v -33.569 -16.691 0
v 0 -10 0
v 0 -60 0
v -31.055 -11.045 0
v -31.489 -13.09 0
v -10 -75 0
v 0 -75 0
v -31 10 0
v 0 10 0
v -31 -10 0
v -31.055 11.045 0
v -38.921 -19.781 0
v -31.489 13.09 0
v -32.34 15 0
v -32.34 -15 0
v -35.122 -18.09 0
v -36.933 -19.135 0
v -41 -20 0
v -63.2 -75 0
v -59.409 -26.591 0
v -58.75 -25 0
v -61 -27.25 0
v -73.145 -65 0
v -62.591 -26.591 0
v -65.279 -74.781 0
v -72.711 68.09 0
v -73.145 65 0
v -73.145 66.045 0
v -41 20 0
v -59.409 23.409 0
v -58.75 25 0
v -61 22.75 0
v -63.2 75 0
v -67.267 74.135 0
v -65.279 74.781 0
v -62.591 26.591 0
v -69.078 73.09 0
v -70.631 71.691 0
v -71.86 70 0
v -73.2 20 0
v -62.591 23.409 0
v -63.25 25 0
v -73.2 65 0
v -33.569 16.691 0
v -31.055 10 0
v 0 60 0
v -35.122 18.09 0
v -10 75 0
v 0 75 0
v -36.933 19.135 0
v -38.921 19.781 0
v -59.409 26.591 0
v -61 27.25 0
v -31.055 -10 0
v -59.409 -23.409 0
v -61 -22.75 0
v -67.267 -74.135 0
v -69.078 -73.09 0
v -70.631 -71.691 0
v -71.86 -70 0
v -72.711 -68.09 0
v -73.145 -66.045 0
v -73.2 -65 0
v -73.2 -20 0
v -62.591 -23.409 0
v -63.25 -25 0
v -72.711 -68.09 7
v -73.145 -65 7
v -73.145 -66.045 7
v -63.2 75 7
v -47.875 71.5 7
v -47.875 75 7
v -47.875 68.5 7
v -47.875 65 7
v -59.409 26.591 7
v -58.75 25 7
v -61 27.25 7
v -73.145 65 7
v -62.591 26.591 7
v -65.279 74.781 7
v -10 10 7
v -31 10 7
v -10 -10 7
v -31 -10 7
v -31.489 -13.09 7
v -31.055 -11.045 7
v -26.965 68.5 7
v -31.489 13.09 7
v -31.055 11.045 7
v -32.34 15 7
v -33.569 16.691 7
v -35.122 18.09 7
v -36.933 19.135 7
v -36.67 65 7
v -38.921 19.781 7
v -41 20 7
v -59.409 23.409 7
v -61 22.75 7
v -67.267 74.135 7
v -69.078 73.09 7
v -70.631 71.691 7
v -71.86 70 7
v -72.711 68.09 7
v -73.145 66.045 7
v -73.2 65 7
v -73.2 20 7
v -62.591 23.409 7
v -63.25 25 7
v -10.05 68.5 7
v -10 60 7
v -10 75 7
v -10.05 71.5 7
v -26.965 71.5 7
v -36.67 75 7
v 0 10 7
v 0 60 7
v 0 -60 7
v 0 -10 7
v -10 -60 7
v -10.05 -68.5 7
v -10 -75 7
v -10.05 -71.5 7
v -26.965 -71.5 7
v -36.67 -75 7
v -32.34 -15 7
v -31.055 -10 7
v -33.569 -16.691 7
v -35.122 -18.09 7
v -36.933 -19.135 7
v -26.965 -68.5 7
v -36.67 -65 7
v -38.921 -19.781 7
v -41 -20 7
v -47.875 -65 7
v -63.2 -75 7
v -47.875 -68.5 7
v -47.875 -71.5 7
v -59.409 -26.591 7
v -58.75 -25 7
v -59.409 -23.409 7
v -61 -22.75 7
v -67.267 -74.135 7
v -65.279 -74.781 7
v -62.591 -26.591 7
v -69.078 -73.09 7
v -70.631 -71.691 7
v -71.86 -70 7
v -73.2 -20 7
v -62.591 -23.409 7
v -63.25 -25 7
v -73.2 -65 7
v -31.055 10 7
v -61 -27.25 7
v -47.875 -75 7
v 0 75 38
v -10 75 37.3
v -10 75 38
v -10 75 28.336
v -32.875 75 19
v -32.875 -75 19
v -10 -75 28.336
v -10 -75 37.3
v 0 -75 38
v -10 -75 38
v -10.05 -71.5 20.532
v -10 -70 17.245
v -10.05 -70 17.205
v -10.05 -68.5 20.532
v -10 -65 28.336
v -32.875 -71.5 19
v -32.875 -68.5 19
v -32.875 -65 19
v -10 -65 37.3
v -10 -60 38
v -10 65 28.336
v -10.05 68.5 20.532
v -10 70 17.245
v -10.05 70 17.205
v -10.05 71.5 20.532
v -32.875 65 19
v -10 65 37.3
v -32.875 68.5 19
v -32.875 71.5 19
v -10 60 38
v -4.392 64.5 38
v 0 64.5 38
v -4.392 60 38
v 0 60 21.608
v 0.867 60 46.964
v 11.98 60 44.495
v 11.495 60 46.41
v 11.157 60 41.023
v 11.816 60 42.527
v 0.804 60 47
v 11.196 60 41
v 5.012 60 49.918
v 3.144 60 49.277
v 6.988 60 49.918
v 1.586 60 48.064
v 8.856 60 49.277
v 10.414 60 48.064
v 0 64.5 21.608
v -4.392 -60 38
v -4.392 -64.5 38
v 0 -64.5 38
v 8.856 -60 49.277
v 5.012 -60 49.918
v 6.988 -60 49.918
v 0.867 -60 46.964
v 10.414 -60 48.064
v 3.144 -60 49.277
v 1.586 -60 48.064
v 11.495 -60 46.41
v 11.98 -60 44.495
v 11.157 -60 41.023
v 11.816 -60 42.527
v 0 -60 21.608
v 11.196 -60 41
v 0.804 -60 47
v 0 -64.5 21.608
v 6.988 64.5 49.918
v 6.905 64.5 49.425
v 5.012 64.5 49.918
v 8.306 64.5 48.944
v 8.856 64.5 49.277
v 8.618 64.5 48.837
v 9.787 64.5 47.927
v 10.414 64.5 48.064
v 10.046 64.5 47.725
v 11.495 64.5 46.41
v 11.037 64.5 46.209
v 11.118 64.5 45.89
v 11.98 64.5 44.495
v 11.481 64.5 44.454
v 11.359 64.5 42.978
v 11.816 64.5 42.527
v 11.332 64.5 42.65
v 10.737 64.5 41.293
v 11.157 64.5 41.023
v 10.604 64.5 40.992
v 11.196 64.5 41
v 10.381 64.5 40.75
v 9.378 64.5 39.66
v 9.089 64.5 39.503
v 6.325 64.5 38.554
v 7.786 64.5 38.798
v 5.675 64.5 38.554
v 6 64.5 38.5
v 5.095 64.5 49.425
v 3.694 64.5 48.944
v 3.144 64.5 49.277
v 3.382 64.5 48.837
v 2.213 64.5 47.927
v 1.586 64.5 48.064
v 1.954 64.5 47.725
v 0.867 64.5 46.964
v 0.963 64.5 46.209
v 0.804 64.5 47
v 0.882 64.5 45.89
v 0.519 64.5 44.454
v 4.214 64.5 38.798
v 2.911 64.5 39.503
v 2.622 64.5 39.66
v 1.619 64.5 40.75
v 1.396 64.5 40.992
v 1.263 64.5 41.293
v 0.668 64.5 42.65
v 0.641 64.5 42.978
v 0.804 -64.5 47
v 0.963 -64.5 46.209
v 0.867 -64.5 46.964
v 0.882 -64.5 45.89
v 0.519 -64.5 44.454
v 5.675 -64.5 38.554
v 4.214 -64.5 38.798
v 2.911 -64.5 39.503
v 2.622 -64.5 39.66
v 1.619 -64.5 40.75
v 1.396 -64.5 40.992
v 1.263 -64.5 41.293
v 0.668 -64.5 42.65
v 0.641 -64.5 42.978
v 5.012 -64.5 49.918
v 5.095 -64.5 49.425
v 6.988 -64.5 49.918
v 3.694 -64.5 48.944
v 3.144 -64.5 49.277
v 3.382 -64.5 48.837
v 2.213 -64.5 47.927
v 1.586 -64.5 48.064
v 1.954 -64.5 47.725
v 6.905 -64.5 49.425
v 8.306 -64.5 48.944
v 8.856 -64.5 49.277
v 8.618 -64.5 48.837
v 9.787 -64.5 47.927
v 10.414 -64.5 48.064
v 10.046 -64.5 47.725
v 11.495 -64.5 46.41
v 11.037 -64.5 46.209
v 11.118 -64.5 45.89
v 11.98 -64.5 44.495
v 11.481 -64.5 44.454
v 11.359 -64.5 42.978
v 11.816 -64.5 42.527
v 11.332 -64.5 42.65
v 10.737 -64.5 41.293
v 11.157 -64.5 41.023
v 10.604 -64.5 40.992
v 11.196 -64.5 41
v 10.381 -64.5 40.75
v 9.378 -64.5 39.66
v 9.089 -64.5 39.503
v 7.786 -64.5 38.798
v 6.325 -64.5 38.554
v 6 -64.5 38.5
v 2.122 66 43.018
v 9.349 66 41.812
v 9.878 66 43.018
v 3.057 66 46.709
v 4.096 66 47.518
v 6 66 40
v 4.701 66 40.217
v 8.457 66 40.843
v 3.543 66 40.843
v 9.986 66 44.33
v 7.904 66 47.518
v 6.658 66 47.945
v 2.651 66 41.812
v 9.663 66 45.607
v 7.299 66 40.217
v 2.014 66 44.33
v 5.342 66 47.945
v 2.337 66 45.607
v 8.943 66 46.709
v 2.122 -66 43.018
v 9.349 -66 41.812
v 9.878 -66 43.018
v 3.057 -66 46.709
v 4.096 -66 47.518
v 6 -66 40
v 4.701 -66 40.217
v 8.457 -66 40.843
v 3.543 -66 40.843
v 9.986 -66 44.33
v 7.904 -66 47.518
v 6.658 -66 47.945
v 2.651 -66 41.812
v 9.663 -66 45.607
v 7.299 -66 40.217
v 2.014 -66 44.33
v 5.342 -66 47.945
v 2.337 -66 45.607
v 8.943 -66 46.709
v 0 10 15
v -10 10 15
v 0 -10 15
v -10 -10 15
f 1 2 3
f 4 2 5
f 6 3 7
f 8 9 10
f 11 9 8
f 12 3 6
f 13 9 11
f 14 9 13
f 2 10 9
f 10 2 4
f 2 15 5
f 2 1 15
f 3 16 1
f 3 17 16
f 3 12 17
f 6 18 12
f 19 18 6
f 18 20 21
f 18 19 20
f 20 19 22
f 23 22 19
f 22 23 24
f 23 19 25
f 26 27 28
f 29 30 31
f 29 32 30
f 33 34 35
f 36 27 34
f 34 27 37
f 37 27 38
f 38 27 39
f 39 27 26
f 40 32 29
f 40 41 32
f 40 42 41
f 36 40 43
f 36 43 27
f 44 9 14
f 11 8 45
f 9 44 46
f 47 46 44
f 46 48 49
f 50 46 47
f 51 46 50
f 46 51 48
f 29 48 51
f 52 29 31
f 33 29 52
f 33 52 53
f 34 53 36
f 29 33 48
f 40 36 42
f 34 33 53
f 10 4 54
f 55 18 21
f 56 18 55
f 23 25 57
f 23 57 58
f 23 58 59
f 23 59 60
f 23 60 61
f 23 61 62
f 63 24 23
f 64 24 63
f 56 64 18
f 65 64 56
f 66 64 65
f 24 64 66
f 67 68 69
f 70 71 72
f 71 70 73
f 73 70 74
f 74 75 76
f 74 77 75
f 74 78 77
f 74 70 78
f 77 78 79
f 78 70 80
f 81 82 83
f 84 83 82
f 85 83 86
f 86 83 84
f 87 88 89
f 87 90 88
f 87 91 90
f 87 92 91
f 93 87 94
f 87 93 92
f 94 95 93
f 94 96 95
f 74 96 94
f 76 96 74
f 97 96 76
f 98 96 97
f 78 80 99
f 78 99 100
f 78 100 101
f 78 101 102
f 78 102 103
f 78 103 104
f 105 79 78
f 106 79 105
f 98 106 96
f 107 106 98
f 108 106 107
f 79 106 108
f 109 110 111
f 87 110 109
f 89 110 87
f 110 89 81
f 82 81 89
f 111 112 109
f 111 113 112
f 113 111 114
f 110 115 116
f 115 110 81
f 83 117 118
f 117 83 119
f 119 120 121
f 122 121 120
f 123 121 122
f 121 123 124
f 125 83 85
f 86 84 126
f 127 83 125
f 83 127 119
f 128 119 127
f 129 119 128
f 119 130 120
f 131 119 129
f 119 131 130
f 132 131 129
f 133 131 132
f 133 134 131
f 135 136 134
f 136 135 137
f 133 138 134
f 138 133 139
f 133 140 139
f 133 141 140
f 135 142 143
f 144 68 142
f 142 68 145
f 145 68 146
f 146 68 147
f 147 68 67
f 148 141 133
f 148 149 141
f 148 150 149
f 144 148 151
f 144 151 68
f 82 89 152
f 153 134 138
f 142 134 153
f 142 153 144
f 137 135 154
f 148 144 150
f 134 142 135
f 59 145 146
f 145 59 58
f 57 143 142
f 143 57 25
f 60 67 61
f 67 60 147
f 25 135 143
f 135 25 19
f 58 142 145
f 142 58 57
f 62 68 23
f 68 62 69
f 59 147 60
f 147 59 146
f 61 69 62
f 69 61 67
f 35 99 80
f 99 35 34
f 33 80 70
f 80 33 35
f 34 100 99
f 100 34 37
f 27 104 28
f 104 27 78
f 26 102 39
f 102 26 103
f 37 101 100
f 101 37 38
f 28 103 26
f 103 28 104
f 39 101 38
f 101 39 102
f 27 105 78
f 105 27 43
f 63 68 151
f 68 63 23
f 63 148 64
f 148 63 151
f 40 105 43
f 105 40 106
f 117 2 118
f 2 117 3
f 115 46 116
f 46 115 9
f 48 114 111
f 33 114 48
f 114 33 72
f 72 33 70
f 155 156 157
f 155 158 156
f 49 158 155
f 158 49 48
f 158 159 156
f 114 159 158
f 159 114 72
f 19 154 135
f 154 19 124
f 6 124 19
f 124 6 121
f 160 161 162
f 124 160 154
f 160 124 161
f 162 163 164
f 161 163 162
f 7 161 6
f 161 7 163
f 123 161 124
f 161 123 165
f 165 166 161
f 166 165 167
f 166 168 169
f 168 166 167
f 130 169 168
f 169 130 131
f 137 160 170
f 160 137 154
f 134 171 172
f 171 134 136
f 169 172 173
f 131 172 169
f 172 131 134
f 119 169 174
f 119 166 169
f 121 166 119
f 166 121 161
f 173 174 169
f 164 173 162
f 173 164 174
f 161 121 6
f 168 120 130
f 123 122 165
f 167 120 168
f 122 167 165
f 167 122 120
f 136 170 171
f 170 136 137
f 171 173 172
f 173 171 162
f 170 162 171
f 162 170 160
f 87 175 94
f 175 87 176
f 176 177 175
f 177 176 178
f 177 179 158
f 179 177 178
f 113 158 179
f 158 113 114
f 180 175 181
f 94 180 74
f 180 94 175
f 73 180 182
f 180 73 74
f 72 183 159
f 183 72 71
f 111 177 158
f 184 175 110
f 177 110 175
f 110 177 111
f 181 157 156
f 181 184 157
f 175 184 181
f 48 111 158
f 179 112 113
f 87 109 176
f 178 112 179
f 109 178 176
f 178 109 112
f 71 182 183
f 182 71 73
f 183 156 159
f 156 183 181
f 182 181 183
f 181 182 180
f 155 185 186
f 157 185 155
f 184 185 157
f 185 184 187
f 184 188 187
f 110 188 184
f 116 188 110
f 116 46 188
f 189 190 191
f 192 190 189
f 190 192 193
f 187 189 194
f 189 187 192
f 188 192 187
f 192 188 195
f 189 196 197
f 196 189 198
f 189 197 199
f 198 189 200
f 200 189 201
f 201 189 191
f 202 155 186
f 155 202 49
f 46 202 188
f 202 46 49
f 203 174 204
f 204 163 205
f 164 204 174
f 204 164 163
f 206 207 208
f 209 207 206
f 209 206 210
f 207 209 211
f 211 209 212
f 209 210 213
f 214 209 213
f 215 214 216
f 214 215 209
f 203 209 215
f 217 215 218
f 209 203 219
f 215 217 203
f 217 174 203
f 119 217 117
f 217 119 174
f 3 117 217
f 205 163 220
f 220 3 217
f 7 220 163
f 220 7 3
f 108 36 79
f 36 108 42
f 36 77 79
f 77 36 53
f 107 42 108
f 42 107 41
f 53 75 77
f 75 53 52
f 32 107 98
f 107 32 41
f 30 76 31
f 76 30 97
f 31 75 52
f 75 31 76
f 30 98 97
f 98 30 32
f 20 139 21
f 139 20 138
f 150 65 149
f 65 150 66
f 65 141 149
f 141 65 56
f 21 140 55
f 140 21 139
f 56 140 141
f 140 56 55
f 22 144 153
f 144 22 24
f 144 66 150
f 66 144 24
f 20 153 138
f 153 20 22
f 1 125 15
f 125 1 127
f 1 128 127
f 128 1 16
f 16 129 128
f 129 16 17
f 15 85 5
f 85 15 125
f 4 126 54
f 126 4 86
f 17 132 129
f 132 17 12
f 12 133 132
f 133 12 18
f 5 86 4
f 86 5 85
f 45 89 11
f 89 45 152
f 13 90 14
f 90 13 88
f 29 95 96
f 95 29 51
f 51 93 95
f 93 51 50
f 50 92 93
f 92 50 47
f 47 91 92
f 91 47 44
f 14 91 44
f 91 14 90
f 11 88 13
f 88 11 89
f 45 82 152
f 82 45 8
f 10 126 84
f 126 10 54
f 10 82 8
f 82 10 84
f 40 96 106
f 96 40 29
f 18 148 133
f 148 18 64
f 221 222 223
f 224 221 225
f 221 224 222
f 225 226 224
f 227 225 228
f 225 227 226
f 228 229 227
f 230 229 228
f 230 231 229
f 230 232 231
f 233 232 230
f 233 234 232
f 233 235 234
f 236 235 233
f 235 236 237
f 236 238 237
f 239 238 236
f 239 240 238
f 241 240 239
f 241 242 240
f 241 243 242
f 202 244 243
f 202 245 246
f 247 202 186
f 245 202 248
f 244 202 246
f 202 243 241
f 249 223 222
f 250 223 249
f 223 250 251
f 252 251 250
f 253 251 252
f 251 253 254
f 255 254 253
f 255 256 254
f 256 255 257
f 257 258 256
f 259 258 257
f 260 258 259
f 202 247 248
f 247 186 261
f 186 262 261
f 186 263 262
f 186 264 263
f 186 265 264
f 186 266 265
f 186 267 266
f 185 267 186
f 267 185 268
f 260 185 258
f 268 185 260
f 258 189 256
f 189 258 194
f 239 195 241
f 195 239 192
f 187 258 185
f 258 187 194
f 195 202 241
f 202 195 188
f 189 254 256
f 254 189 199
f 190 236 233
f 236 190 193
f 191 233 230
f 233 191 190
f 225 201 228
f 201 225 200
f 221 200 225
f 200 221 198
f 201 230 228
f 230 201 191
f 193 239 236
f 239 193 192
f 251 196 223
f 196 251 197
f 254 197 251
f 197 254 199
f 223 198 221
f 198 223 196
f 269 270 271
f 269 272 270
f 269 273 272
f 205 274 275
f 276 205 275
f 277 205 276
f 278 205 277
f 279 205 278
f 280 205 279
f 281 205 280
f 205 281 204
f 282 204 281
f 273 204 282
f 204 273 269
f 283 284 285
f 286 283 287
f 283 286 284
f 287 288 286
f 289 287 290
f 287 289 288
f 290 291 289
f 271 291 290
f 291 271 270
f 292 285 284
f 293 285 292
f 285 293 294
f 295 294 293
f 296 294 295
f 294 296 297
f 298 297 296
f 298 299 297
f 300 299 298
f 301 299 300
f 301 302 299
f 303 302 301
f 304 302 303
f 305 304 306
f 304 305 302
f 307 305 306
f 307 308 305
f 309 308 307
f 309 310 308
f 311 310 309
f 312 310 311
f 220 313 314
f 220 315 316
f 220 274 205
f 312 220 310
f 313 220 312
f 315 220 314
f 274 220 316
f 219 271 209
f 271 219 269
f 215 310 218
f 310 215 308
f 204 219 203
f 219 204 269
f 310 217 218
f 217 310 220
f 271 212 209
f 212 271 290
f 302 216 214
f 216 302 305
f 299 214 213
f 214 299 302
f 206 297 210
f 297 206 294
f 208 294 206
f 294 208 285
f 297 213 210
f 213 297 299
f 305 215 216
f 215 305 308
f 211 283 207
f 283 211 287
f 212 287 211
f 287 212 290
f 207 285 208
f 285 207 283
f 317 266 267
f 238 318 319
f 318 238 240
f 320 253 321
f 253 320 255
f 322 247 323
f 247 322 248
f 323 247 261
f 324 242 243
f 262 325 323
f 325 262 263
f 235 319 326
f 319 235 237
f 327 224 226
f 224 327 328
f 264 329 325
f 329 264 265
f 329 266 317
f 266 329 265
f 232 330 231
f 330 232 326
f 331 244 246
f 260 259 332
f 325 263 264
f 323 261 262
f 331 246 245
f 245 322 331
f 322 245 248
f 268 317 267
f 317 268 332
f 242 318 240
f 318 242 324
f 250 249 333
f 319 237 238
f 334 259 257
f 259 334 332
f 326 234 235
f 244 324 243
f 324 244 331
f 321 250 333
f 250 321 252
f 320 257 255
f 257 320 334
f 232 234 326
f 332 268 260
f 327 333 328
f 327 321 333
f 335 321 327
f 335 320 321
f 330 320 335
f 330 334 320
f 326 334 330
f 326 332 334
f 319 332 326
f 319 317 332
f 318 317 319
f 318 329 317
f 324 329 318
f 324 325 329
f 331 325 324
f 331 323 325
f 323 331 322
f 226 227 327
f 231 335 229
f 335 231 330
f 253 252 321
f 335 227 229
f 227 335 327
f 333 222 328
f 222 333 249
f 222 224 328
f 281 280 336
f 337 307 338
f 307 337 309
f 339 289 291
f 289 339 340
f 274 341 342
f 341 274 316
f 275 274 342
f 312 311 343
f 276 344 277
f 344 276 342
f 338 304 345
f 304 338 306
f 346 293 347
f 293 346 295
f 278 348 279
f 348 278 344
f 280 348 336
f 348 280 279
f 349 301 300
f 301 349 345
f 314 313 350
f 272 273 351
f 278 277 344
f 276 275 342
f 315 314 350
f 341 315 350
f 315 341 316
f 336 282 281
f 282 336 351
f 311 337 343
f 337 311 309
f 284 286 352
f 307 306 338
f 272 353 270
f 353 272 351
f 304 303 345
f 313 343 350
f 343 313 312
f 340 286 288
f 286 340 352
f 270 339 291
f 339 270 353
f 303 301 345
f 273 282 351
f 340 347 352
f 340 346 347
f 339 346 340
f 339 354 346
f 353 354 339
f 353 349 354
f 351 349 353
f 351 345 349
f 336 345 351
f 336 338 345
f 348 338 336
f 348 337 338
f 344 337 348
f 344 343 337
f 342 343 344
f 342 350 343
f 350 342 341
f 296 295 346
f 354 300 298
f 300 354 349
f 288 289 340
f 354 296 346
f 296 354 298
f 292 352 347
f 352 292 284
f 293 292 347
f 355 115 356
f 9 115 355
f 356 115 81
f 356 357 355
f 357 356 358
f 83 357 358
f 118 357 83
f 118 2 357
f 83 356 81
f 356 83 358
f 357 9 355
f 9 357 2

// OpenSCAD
// file: joiners.scad
include <config.scad>
use <GDMUtils.scad>


module half_joiner_clear(h=20, w=10, a=30)
{
	dmnd_height = h*1.0;
	dmnd_width = dmnd_height*tan(a);
	guide_size = w/3;
	guide_width = 2*(dmnd_height/2-guide_size)*tan(a);

	difference() {
		// Diamonds.
		scale([w, dmnd_width/2, dmnd_height/2]) {
			xrot(45) cube(size=[1,sqrt(2),sqrt(2)], center=true);
		}
		// Blunt point of tab.
		grid_of(ya=[-(guide_width/2+2), (guide_width/2+2)]) {
			cube(size=[w*1.05, 4, guide_size*2], center=true);
		}
	}
}
//half_joiner_clear();



module half_joiner(h=20, w=10, l=10, a=30, screwsize=3, guides=true, slop=printer_slop)
{
	dmnd_height = h*1.0;
	dmnd_width = dmnd_height*tan(a);
	guide_size = w/3;
	guide_width = 2*(dmnd_height/2-guide_size)*tan(a);

	difference() {
		union() {
			// Make base.
			difference() {
				// Solid backing base.
				translate([0,-l/2,0])
					cube(size=[w, l, h], center=true);

				// Clear diamond for tab
				half_joiner_clear(h=h, w=w+0.05, a=a);
			}

			difference() {
				// Make tab
				scale([w/3-slop*2, dmnd_width/2, dmnd_height/2]) xrot(45)
					cube(size=[1,sqrt(2),sqrt(2)], center=true);

				// Blunt point of tab.
				translate([0,guide_width/2+2,0])
					cube(size=[w*0.99,4,guide_size*2], center=true);
			}


			// Guide ridges.
			if (guides == true) {
				grid_of(xa=[-(w/6-slop), (w/6-slop)]) {
					// Guide ridge.
					scale([0.75, 1, 2]) yrot(45)
						cube(size=[guide_size/sqrt(2), guide_width, guide_size/sqrt(2)], center=true);

					// Snap ridge.
					scale([0.25, 0.5, 1]) zrot(45)
						cube(size=[guide_size/sqrt(2), guide_size/sqrt(2), dmnd_width], center=true);
				}
			}
		}

		// Make screwholes, if needed.
		if (screwsize != undef) {
			yrot(90) cylinder(r=screwsize*1.1/2, h=w+1, center=true, $fn=12);
		}
	}
}
//half_joiner(screwsize=3);



module half_joiner2(h=20, w=10, l=10, a=30, screwsize=3, guides=true)
{
	difference() {
		union () {
			translate([0,-l/2,0])
				cube(size=[w, l, h], center=true);
			half_joiner_clear(h=h, w=w, a=a);
		}

		// Subtract mated half_joiner.
		zrot(180) half_joiner(h=h+0.05, w=w+0.05, l=l+0.05, a=a, screwsize=undef, guides=guides, slop=0.0);

		// Make screwholes, if needed.
		if (screwsize != undef) {
			yrot(90) cylinder(r=screwsize*1.1/2, h=w+1, center=true, $fn=12);
		}
	}
}
//half_joiner2(screwsize=3);



module joiner(h=40, w=10, l=10, a=30, screwsize=3, guides=true, slop=printer_slop)
{
	render(convexity=10) union() {
		translate([0,0,h/4])
			half_joiner(h=h/2, w=w, l=l, a=a, screwsize=screwsize, guides=guides, slop=slop);
		translate([0,0,-h/4])
			half_joiner2(h=h/2, w=w, l=l, a=a, screwsize=screwsize, guides=guides);
	}
}
//joiner(screwsize=3);



module joiner_clear(h=40, w=10, a=30)
{
	grid_of(za=[-h/4,h/4]) {
		half_joiner_clear(h=h/2.0, w=w, a=a);
	}
}
//joiner_clear();



module joiner_pair(spacing=100, h=40, w=10, l=10, a=30, screwsize=3, guides=true)
{
	yrot_copies([0,180]) {
		translate([spacing/2, 0, 0]) {
			joiner(h=h, w=w, l=l, a=a, screwsize=screwsize, guides=guides);
		}
	}
}
//joiner_pair(spacing=100, h=40, w=10, l=10, a=30, screwsize=3, guides=true);



module joiner_pair_clear(spacing=100, h=40, w=10, a=30)
{
	yrot_copies([0,180]) {
		translate([spacing/2, 0, 0]) {
			joiner_clear(h=h, w=w, a=a);
		}
	}
}
//joiner_pair_clear(spacing=100, h=40, w=10, a=30);



module joiner_quad(xspacing=100, yspacing=50, h=40, w=10, l=10, a=30, screwsize=3, guides=true)
{
	zrot_copies([0,180]) {
		translate([0, yspacing/2, 0]) {
			joiner_pair(spacing=xspacing, h=h, w=w, l=l, a=a, screwsize=screwsize, guides=guides);
		}
	}
}
//joiner_quad(xspacing=100, yspacing=50, h=40, w=10, l=10, a=30, screwsize=3, guides=true);



module joiner_quad_clear(xspacing=100, yspacing=50, h=40, w=10, a=30)
{
	zrot_copies([0,180]) {
		translate([0, yspacing/2, 0]) {
			joiner_pair_clear(spacing=xspacing, h=h, w=w, a=a);
		}
	}
}
//joiner_quad_clear(xspacing=100, yspacing=50, h=40, w=10, a=30);



// vim: noexpandtab tabstop=4 shiftwidth=4 softtabstop=4 nowrap
// file: config.scad
snappy_version = 0.91;


// 0 = Thinning Walls (Thin in the middle, thick at edges.  Prettier smooth walls.)
// 1 = Corrugated walls. (Zig-zagged walls. Less shrinkage stress. Closed walls.)
// 2 = Crossbeam walls. (Open sparse struts. Far less shrinkage stress.)
wall_styling = 2;


platform_length = 100; // mm.  Must be a multiple of rack_tooth_size.
platform_width  = 150; // mm
platform_height =  40; // mm
platform_thick  =   7; // mm

rail_length   = 150;    // mm
rail_height   =  50;    // mm
rail_thick    =   7;    // mm
rail_offset   =  12;    // mm

motor_rail_length = 100; // mm

groove_angle  =  30;    // degrees
groove_height =  12;    // mm

joiner_angle  =  30;    // degrees
joiner_width  =  10;    // mm

rack_tooth_size  =  5; // mm per tooth.
set_screw_size   =  3; // mm size of set screw in drive gears, couplers, etc
motor_shaft_size =  5; // mm
motor_shaft_flatted = false;  // boolean. Set true if motor shaft has a flattened side.

// Currently configured for 3/8" ACME threaded rod and matching 11/16" nut
lifter_rod_diam    =   9.5; // mm
lifter_rod_length  = 300.0; // mm
lifter_nut_size    =  17.4; // mm
lifter_nut_thick   =   9.3; // mm
lifter_thread_size =   3.175; // mm lift per revolution

endstop_hole_spacing = 19;   // mm
endstop_hole_inset   =  3.2; // mm
endstop_hole_hoff    = 10;   // mm
endstop_screw_size   =  3;   // mm

// This is the slop needed to make parts fit more exactly, and may be
// printer dependant.  Printing a slop calibration plate should help
// dial this setting in for your printer.
printer_slop =   0.25; // mm



// Commonly used derived values.  Don't change these.
rail_spacing = platform_width - joiner_width*4 - 10;
rail_width = rail_spacing + joiner_width*2;
motor_mount_spacing=43+joiner_width+10;

wall_styles = ["thinwall", "corrugated", "crossbeams"];
wall_style = wall_styles[wall_styling];


// vim: noexpandtab tabstop=4 shiftwidth=4 softtabstop=4 nowrap
// main file
include <config.scad>
use <GDMUtils.scad>
use <joiners.scad>


module extruder_platform()
{
	platform_vert_off = rail_height+groove_height+rail_offset;
	l = motor_rail_length*0.5+platform_length-platform_vert_off-15;
	w = platform_width;
	h = rail_height;

	color("LightSteelBlue")
	render(convexity=10)
	translate([0, l, 0])
	union() {
		difference() {
			union() {
				// Bottom.
				translate([0, -(0.4*l), rail_thick/2])
					rrect(r=joiner_width, size=[platform_width, 1.2*l, rail_thick], center=true);

				// Walls.
				grid_of(
					xa=[-(w-joiner_width)/2, (w-joiner_width)/2],
					ya=[-(l-l*0.75/2-10)],
					za=[(h-12)/2]
				) {
					thinning_triangle(h=h-12, l=l*0.75, thick=joiner_width, strut=rail_thick, diagonly=true);
				}

				// Triangle Backing
				mirror_copy([1,0,0]) {
					translate([(w-joiner_width-5)/2, -l+10/2, (h-12)/2]) {
						cube(size=[joiner_width+5, 10, h-12], center=true);
					}
				}
			}

			// Blunt off end of platform.
			translate([0, l+rail_thick*2, 0])
				cube(size=[platform_width+1, l, h*3], center=true);

			// Extruder mount holes.
			circle_of(r=25, n=2) {
				cylinder(r=4.5/2, h=20, center=true);
			}

			// Extruder hole.
			rrect(r=10, size=[40, 60, 20], center=true);
		}

		// Pivot backings
		mirror_copy([1,0,0]) {
			translate([(w-joiner_width-4.5)/2-5.5, -l-6, h-6]) {
				difference() {
					xrot(joiner_angle) {
						translate([0, 0, -12/sin(joiner_angle)/2]) {
							cube(size=[4.5, 12, 12/sin(joiner_angle)], center=true);
						}
					}
					translate([0, 12+10, -12*2*sin(joiner_angle)])
						cube(size=[4.5, 12, 12/sin(joiner_angle)], center=true);
				}
			}
			translate([(w-joiner_width-4.5)/2-5.5, -l-6, h-6]) {
				yrot(90) cylinder(h=4.5, r=6, center=true);
			}
		}

		// Pivot
		mirror_copy([1,0,0]) {
			translate([w/2-joiner_width, -l-6, h-6]) {
				yrot(90) intersection() {
					cylinder(h=2, r1=6, r2=4, center=true);
					cylinder(h=2, r=6, center=true);
				}
			}
		}

		// Z endstop block.
		translate([0, -l+10/2, 15/2]) {
			cube(size=[20, 10, 15], center=true);
		}
	}
}
//!rail_structure();



module extruder_platform_parts() { // make me
	zrot(90) extruder_platform();
}



extruder_platform_parts();



// vim: noexpandtab tabstop=4 shiftwidth=4 softtabstop=4 nowrap
